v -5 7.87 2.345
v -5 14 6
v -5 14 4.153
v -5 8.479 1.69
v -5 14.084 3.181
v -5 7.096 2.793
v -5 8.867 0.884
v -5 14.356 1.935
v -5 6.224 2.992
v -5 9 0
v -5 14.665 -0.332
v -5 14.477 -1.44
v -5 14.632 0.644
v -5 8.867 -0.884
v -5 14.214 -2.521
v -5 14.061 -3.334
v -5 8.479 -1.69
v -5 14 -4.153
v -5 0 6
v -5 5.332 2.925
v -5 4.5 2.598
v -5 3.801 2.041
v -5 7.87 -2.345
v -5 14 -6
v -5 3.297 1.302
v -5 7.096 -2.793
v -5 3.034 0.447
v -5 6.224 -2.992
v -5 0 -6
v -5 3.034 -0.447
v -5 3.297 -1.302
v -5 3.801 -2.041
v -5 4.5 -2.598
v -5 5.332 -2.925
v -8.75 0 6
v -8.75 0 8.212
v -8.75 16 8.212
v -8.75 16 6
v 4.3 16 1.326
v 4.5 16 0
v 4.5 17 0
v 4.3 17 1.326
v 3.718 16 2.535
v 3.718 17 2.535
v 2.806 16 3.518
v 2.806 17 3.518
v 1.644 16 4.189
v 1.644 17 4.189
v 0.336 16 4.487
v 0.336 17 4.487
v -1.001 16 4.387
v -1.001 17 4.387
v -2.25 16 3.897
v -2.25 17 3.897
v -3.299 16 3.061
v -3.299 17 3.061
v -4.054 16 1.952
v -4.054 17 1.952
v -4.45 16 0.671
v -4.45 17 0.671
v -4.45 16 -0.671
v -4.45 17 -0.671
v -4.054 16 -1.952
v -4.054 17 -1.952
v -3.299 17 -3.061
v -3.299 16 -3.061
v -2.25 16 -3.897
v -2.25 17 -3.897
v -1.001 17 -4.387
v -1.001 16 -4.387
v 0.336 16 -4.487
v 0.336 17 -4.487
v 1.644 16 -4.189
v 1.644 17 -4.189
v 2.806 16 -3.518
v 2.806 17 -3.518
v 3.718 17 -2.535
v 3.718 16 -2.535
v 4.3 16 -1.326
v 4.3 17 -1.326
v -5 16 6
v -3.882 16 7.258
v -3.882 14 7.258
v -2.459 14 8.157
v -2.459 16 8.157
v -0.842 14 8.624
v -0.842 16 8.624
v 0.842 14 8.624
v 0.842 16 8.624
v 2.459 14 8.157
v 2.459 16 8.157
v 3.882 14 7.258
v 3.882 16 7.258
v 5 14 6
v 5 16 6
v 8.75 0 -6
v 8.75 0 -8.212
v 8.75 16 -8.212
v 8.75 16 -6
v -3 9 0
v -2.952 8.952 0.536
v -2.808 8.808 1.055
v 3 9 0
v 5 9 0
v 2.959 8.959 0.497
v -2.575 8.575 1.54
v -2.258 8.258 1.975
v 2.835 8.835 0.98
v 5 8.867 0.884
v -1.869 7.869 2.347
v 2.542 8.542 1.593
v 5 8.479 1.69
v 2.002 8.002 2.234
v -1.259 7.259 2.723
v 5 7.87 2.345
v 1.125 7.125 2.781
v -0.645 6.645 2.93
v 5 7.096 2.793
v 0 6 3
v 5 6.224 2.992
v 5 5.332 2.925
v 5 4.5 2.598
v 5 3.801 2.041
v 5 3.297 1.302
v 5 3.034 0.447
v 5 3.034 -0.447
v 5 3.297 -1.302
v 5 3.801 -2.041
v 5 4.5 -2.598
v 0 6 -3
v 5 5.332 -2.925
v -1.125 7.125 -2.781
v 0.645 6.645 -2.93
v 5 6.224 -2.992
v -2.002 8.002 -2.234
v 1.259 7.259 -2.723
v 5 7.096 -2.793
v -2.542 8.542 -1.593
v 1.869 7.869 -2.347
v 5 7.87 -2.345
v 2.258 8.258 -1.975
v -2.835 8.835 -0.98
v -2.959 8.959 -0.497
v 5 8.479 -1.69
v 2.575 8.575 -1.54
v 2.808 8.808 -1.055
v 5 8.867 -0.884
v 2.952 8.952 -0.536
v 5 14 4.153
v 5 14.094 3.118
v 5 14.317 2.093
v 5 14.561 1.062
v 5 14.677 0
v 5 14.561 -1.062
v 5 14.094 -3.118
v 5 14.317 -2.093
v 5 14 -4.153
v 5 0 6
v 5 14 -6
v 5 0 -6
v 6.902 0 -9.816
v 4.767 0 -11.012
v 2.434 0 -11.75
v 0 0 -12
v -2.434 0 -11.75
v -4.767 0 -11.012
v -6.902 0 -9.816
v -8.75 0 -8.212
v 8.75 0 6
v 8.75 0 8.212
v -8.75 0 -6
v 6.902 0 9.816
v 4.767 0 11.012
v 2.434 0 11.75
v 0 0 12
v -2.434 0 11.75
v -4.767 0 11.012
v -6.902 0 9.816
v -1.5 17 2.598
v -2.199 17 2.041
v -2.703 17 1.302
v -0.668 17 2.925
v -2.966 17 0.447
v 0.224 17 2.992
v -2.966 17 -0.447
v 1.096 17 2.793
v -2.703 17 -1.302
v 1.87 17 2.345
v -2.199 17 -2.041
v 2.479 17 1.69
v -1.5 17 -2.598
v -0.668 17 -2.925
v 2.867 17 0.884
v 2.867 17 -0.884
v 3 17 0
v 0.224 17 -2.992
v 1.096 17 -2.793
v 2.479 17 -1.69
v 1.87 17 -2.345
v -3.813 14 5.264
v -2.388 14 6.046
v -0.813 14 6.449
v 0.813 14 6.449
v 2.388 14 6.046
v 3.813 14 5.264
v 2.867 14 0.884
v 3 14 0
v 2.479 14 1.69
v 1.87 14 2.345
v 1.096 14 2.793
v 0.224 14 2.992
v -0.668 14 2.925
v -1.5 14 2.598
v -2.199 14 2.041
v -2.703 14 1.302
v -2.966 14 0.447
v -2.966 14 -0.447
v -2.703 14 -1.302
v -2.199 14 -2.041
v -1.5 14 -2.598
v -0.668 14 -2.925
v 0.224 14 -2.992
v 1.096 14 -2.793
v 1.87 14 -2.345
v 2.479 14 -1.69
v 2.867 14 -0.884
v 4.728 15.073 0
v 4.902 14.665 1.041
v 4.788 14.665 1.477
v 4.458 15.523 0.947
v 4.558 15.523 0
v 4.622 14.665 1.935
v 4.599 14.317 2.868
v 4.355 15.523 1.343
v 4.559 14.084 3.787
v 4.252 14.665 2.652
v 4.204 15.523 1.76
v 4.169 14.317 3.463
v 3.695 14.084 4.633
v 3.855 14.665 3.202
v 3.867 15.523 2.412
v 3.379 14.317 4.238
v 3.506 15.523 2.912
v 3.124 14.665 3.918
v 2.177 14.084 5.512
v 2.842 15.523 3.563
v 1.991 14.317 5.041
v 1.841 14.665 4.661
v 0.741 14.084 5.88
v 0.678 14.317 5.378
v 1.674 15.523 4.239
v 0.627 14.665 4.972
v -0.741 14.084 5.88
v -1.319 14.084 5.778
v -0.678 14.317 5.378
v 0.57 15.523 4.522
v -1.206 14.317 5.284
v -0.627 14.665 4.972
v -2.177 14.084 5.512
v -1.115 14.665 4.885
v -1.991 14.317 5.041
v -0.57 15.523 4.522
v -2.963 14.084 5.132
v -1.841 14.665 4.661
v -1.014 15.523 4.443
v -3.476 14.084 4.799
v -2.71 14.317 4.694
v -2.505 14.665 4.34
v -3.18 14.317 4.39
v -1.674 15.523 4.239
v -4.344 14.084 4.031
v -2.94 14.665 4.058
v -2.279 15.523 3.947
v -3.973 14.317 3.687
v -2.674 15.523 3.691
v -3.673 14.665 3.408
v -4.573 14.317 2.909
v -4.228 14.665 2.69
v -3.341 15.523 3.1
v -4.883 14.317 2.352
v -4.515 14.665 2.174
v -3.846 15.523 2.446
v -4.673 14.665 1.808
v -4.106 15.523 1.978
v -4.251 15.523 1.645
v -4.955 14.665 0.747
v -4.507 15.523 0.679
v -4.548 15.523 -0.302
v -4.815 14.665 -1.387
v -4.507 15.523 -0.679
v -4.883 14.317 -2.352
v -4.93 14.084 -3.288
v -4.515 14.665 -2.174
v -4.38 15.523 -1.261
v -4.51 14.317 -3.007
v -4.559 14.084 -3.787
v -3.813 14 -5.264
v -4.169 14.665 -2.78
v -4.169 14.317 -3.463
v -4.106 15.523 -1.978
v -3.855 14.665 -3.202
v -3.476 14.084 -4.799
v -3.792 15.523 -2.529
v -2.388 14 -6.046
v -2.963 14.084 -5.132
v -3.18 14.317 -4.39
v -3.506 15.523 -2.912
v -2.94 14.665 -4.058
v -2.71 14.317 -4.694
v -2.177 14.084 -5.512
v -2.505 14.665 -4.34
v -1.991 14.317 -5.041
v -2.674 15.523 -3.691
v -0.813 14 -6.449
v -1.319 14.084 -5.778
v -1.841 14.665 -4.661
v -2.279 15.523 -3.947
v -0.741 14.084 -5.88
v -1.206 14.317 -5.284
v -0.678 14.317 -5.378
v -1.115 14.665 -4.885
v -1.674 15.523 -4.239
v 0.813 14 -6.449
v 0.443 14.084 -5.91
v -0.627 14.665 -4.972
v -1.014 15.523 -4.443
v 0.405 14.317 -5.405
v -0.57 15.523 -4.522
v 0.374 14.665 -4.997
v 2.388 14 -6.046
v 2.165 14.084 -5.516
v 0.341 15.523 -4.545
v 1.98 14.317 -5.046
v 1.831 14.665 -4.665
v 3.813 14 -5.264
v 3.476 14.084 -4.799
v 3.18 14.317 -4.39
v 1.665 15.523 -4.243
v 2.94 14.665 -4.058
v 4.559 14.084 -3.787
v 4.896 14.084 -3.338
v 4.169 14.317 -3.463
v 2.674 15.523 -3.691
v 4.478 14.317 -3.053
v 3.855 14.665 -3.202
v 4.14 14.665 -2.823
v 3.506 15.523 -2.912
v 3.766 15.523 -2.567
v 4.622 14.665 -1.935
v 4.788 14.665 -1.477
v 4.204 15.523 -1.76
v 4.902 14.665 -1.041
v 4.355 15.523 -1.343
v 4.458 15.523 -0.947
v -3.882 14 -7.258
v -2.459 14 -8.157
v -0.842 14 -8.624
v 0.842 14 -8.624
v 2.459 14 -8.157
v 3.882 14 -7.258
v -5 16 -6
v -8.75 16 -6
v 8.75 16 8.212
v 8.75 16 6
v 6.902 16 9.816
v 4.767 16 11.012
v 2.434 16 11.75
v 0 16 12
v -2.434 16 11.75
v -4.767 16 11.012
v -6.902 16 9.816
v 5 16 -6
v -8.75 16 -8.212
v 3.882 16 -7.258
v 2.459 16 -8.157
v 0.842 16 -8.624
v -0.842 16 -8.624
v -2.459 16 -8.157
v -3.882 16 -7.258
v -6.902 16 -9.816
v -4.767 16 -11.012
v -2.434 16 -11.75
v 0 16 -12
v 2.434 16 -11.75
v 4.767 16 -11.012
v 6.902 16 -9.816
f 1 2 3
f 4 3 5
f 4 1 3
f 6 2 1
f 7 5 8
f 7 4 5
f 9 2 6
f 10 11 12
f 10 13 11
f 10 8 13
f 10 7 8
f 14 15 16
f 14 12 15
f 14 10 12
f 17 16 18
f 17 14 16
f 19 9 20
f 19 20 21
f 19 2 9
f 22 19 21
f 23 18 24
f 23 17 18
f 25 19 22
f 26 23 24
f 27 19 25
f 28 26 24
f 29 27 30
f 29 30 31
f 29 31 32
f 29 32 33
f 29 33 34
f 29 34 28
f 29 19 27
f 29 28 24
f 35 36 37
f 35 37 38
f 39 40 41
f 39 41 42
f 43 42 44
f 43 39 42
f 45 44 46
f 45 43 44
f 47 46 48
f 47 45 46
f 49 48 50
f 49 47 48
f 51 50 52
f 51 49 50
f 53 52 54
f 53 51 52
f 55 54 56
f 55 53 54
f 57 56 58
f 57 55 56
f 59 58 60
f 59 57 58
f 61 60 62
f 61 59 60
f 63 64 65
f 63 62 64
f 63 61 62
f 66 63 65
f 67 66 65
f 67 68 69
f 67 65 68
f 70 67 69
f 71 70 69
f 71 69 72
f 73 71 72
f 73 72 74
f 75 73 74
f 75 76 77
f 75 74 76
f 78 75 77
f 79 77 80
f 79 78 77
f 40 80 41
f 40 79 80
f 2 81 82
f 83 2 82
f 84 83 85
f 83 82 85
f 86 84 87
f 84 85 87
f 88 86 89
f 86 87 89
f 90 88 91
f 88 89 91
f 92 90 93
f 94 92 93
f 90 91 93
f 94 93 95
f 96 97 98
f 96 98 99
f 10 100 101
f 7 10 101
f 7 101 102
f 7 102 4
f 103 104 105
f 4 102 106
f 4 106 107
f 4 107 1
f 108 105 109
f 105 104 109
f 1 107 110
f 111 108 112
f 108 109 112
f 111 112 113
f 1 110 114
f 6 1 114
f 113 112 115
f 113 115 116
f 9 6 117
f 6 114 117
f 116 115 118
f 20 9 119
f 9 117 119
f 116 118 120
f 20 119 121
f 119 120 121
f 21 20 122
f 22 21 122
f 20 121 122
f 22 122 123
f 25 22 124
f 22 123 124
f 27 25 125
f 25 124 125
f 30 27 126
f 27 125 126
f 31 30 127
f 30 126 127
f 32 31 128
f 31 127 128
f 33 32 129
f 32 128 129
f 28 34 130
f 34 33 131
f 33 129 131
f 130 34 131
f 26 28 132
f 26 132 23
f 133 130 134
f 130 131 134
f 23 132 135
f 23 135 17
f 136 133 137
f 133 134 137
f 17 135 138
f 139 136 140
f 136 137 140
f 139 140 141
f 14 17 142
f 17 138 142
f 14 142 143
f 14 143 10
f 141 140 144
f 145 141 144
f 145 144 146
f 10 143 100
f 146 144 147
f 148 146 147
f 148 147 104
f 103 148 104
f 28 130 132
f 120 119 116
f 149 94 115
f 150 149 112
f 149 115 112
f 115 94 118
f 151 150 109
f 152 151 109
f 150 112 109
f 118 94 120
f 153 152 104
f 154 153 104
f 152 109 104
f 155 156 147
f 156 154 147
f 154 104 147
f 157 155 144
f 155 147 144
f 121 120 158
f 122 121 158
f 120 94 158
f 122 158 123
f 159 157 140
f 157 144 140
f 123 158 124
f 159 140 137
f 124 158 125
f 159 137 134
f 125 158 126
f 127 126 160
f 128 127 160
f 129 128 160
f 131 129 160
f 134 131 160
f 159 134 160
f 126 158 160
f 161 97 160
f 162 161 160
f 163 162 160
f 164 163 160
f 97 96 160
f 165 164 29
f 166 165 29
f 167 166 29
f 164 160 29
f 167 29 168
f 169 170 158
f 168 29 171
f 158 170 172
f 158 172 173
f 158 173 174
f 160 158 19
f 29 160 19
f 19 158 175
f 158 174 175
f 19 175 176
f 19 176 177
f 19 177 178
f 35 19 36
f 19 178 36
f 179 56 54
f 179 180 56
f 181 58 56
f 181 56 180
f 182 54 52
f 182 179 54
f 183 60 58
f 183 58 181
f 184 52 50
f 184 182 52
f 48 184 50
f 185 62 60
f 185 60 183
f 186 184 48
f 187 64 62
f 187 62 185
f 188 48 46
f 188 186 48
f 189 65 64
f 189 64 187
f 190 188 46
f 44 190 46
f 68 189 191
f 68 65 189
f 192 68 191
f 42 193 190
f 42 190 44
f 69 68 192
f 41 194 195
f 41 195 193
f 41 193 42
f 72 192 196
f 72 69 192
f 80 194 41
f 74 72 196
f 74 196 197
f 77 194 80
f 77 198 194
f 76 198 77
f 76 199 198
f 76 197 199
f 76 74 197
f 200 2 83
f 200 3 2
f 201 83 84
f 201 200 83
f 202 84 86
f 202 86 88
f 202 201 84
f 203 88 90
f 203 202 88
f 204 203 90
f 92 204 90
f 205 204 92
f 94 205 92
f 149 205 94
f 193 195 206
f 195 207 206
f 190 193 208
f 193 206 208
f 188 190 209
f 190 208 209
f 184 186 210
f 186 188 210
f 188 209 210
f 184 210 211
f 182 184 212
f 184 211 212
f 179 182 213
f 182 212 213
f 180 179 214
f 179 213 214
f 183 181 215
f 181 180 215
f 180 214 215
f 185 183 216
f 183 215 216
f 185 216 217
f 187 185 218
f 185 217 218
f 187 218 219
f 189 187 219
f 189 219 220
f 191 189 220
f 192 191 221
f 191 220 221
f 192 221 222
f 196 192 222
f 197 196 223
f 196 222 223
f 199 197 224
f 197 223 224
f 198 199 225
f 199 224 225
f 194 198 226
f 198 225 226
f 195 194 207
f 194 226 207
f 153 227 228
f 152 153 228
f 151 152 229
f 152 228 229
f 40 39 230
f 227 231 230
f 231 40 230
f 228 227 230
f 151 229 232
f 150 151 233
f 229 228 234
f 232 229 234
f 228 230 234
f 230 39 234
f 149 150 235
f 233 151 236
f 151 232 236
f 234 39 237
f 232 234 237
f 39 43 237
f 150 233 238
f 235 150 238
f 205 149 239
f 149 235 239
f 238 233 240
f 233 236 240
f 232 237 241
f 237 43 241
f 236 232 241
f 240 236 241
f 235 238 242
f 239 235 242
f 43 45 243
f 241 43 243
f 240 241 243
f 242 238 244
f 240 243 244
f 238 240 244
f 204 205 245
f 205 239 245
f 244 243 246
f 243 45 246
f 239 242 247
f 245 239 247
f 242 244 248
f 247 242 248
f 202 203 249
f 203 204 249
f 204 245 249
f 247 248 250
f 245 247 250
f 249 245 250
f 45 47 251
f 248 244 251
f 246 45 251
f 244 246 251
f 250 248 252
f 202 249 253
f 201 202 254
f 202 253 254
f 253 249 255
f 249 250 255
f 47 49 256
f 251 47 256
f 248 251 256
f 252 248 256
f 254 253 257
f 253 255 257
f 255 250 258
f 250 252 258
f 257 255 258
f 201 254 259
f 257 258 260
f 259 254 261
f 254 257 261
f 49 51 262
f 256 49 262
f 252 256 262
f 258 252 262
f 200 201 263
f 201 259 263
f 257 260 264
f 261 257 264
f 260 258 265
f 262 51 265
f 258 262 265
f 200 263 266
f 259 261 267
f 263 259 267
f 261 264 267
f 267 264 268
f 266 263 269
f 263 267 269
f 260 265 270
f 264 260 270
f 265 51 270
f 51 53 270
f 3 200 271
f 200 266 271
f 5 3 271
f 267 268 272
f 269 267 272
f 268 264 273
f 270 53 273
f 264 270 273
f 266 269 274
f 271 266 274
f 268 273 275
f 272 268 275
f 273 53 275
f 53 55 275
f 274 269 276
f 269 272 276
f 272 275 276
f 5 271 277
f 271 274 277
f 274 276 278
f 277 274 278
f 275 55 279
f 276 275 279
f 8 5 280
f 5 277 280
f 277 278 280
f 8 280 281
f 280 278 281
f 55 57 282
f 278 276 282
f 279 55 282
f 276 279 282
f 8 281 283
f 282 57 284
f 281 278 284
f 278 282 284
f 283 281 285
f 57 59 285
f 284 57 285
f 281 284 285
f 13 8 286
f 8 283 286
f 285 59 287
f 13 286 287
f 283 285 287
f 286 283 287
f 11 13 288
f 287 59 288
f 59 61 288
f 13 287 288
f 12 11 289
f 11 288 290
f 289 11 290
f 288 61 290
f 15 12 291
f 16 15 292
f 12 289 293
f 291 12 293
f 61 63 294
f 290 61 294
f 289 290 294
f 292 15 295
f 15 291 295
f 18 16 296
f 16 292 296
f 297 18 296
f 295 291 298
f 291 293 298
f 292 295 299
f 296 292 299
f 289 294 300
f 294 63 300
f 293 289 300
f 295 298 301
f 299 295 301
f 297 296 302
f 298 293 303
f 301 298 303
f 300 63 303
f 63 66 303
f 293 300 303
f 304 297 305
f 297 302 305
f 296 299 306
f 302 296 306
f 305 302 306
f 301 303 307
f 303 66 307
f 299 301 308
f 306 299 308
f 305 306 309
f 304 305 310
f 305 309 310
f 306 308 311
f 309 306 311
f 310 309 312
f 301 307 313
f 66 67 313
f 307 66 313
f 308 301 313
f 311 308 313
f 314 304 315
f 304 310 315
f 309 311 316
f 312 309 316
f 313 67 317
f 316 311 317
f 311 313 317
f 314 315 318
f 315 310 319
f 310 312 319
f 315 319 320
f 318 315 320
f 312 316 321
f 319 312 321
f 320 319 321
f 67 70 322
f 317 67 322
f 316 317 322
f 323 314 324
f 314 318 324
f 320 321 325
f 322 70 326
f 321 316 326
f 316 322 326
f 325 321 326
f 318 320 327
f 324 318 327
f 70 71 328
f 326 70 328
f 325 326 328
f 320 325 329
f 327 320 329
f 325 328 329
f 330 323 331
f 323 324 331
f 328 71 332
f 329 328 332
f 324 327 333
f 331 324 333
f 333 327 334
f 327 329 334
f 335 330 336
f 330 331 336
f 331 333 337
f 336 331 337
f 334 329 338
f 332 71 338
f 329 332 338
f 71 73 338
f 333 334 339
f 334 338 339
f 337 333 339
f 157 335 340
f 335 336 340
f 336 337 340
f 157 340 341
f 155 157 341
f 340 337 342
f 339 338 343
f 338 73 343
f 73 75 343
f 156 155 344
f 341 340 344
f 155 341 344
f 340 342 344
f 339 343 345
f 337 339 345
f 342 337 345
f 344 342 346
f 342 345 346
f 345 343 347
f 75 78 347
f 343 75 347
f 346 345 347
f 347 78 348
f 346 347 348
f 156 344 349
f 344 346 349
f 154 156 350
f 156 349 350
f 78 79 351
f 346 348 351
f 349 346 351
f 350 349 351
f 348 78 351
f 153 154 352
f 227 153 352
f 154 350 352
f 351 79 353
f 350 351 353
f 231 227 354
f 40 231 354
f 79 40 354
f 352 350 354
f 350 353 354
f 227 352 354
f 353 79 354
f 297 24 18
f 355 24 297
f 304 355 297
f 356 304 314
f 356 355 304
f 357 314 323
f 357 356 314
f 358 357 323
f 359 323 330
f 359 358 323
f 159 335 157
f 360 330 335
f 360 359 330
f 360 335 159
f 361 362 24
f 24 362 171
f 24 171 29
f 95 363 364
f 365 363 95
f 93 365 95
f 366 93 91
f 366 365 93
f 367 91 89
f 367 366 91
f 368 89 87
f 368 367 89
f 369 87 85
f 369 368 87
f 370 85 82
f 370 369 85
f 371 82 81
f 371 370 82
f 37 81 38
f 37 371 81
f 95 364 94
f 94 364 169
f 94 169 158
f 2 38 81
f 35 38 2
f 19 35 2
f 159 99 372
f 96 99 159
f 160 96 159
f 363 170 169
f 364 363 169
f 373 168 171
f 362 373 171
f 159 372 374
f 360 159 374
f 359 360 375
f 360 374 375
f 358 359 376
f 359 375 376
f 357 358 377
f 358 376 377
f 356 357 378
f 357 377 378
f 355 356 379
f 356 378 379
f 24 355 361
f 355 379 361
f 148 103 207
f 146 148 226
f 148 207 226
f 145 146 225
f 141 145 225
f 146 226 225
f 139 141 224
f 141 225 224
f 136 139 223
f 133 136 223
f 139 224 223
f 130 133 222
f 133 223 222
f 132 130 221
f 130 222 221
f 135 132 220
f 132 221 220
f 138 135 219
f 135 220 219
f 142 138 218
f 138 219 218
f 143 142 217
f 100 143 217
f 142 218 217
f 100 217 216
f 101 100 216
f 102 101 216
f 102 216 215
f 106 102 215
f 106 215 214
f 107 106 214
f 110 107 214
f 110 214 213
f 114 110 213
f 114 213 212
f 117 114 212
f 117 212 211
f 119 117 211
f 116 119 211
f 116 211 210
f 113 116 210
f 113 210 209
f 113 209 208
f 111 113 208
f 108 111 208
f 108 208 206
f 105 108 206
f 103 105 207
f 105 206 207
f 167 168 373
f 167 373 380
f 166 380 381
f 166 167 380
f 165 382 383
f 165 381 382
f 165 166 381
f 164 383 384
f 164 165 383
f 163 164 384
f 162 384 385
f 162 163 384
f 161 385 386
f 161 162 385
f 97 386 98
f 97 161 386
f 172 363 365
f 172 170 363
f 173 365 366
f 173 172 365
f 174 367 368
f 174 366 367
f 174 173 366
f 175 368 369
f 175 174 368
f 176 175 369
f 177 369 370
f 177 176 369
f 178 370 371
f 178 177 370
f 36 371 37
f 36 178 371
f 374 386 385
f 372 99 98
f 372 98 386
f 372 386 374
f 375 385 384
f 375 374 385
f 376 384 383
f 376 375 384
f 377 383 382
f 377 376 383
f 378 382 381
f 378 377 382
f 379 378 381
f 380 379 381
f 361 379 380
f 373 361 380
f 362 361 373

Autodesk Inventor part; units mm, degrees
ref_plane "XZ Plane" through (0, 0, 0) normal (0, 1, 0) x (-1, 0, 0)
ref_plane "XY Plane" through (0, 0, 0) normal (0, 0, 1) x (1, 0, 0)
sketch "Sketch1" plane through (0, 0, 0) normal (0, 1, 0) x (-1, 0, 0)
  circle A0 centre (0, 0) radius 12 construction
  line L0 (-5, -16.2951) -> (5, -16.2951) construction
  arc A1 (-8.75, -8.212) -> (8.75, -8.212) centre (0, 0) ccw construction
  arc A2 (-8.75, -8.212) -> (8.75, -8.212) centre (0, 0) ccw
  line L1 (14.6502, 6) -> (14.6502, -6) construction
  line L2 (8.75, -8.212) -> (8.75, -6)
  line L3 (8.75, -6) -> (5, -6)
  line L4 (-8.75, -8.212) -> (-8.75, -6)
  line L5 (-8.75, -6) -> (-5, -6)
  arc A3 (-5, -6) -> (5, -6) centre (0, -2.6834) ccw
  line L6 (14.6502, 0) -> (-10.8345, 0) construction
  line L7 (8.75, -8.212) -> (8.75, 12.1901) construction
  line L8 (-8.75, -8.212) -> (-8.75, 14.7434) construction
  arc A4 (8.75, 8.212) -> (-8.75, 8.212) centre (0, 0) ccw construction
  line L9 (8.75, 8.212) -> (8.75, 6) construction
  arc A5 (8.75, 8.212) -> (-8.75, 8.212) centre (0, 0) ccw
  line L10 (8.75, 8.212) -> (8.75, 6)
  line L11 (-8.75, 8.212) -> (-8.75, 7.106)
  line L12 (-8.75, 7.106) -> (-8.75, 6)
  line L13 (-8.75, 6) -> (-5, 6)
  line L14 (8.75, 6) -> (5, 6)
  arc A6 (5, 6) -> (-5, 6) centre (0, 2.6834) ccw
  line L15 (-5, 6) -> (-5, -6)
  line L16 (5, 6) -> (5, -6)
  circle A7 centre (0, 0) radius 4.75 construction
  circle A8 centre (0, 0) radius 3 construction
  point P0 (0, -16.2951)
  dimension "d0" = 24
  dimension "d1" = 10
  dimension "d2" = 12
  dimension "d3" = 6
  dimension "d4" = 6
  dimension "d5" = 9.5
  dimension "d6" = 6
extrude "Extrusion1" add sketch "Sketch1" along normal blind 16
sketch "Sketch2" plane through (0, 16, 0) normal (0, 1, 0) x (1, 0, 0)
  line L0 (-5, 6) -> (-5, -6) projected
  line L1 (-5, -6) -> (-5, 6)
  line L2 (5, -6) -> (5, 6) projected
  line L3 (5, -6) -> (5, 6)
  arc A0 (-5, -6) -> (5, -6) centre (0, -2.6834) ccw
  line L4 (5, 6) -> (8.75, 6) projected
  arc A1 (5, 6) -> (-5, 6) centre (0, 2.6834) ccw
  point P0 (0, 0)
  dimension "d9" = 6
  dimension "d10" = 6
extrude "Extrusion2" cut sketch "Sketch2" against normal blind 2
sketch "Sketch3" plane through (0, 14, 0) normal (0, 1, 0) x (1, 0, 0)
  circle A0 centre (0, 0) radius 4.5
  circle A1 centre (0, 0) radius 3
  dimension "d13" = 9
  dimension "d14" = 6
extrude "Extrusion3" add sketch "Sketch3" along normal blind 3
fillet "Fillet1" radius 2 1 edges at (-4.5, 14, 0)
ref_plane "Work Plane1" through (14.75, 0, 0) normal (1, 0, 0) x (0, 1, 0)
sketch "Sketch4" plane through (14.75, 0, 0) normal (1, 0, 0) x (0, 1, 0)
  circle A0 centre (6, 0) radius 3
  point P0 (0, 0)
  dimension "d19" = 6
  dimension "d20" = 6
extrude "Extrusion4" cut sketch "Sketch4" against normal blind 888
sketch "Sketch5" plane through (0, 14, 0) normal (0, 1, 0) x (1, 0, 0)
  circle A0 centre (0, 0) radius 3
  dimension "d23" = 6
extrude "Extrusion5" cut sketch "Sketch5" against normal up to surface
thread "Thread2" size "M6" standard "Din Taper" length 10
properties part number "Crosshead" material "Brass, Soft Yellow"
